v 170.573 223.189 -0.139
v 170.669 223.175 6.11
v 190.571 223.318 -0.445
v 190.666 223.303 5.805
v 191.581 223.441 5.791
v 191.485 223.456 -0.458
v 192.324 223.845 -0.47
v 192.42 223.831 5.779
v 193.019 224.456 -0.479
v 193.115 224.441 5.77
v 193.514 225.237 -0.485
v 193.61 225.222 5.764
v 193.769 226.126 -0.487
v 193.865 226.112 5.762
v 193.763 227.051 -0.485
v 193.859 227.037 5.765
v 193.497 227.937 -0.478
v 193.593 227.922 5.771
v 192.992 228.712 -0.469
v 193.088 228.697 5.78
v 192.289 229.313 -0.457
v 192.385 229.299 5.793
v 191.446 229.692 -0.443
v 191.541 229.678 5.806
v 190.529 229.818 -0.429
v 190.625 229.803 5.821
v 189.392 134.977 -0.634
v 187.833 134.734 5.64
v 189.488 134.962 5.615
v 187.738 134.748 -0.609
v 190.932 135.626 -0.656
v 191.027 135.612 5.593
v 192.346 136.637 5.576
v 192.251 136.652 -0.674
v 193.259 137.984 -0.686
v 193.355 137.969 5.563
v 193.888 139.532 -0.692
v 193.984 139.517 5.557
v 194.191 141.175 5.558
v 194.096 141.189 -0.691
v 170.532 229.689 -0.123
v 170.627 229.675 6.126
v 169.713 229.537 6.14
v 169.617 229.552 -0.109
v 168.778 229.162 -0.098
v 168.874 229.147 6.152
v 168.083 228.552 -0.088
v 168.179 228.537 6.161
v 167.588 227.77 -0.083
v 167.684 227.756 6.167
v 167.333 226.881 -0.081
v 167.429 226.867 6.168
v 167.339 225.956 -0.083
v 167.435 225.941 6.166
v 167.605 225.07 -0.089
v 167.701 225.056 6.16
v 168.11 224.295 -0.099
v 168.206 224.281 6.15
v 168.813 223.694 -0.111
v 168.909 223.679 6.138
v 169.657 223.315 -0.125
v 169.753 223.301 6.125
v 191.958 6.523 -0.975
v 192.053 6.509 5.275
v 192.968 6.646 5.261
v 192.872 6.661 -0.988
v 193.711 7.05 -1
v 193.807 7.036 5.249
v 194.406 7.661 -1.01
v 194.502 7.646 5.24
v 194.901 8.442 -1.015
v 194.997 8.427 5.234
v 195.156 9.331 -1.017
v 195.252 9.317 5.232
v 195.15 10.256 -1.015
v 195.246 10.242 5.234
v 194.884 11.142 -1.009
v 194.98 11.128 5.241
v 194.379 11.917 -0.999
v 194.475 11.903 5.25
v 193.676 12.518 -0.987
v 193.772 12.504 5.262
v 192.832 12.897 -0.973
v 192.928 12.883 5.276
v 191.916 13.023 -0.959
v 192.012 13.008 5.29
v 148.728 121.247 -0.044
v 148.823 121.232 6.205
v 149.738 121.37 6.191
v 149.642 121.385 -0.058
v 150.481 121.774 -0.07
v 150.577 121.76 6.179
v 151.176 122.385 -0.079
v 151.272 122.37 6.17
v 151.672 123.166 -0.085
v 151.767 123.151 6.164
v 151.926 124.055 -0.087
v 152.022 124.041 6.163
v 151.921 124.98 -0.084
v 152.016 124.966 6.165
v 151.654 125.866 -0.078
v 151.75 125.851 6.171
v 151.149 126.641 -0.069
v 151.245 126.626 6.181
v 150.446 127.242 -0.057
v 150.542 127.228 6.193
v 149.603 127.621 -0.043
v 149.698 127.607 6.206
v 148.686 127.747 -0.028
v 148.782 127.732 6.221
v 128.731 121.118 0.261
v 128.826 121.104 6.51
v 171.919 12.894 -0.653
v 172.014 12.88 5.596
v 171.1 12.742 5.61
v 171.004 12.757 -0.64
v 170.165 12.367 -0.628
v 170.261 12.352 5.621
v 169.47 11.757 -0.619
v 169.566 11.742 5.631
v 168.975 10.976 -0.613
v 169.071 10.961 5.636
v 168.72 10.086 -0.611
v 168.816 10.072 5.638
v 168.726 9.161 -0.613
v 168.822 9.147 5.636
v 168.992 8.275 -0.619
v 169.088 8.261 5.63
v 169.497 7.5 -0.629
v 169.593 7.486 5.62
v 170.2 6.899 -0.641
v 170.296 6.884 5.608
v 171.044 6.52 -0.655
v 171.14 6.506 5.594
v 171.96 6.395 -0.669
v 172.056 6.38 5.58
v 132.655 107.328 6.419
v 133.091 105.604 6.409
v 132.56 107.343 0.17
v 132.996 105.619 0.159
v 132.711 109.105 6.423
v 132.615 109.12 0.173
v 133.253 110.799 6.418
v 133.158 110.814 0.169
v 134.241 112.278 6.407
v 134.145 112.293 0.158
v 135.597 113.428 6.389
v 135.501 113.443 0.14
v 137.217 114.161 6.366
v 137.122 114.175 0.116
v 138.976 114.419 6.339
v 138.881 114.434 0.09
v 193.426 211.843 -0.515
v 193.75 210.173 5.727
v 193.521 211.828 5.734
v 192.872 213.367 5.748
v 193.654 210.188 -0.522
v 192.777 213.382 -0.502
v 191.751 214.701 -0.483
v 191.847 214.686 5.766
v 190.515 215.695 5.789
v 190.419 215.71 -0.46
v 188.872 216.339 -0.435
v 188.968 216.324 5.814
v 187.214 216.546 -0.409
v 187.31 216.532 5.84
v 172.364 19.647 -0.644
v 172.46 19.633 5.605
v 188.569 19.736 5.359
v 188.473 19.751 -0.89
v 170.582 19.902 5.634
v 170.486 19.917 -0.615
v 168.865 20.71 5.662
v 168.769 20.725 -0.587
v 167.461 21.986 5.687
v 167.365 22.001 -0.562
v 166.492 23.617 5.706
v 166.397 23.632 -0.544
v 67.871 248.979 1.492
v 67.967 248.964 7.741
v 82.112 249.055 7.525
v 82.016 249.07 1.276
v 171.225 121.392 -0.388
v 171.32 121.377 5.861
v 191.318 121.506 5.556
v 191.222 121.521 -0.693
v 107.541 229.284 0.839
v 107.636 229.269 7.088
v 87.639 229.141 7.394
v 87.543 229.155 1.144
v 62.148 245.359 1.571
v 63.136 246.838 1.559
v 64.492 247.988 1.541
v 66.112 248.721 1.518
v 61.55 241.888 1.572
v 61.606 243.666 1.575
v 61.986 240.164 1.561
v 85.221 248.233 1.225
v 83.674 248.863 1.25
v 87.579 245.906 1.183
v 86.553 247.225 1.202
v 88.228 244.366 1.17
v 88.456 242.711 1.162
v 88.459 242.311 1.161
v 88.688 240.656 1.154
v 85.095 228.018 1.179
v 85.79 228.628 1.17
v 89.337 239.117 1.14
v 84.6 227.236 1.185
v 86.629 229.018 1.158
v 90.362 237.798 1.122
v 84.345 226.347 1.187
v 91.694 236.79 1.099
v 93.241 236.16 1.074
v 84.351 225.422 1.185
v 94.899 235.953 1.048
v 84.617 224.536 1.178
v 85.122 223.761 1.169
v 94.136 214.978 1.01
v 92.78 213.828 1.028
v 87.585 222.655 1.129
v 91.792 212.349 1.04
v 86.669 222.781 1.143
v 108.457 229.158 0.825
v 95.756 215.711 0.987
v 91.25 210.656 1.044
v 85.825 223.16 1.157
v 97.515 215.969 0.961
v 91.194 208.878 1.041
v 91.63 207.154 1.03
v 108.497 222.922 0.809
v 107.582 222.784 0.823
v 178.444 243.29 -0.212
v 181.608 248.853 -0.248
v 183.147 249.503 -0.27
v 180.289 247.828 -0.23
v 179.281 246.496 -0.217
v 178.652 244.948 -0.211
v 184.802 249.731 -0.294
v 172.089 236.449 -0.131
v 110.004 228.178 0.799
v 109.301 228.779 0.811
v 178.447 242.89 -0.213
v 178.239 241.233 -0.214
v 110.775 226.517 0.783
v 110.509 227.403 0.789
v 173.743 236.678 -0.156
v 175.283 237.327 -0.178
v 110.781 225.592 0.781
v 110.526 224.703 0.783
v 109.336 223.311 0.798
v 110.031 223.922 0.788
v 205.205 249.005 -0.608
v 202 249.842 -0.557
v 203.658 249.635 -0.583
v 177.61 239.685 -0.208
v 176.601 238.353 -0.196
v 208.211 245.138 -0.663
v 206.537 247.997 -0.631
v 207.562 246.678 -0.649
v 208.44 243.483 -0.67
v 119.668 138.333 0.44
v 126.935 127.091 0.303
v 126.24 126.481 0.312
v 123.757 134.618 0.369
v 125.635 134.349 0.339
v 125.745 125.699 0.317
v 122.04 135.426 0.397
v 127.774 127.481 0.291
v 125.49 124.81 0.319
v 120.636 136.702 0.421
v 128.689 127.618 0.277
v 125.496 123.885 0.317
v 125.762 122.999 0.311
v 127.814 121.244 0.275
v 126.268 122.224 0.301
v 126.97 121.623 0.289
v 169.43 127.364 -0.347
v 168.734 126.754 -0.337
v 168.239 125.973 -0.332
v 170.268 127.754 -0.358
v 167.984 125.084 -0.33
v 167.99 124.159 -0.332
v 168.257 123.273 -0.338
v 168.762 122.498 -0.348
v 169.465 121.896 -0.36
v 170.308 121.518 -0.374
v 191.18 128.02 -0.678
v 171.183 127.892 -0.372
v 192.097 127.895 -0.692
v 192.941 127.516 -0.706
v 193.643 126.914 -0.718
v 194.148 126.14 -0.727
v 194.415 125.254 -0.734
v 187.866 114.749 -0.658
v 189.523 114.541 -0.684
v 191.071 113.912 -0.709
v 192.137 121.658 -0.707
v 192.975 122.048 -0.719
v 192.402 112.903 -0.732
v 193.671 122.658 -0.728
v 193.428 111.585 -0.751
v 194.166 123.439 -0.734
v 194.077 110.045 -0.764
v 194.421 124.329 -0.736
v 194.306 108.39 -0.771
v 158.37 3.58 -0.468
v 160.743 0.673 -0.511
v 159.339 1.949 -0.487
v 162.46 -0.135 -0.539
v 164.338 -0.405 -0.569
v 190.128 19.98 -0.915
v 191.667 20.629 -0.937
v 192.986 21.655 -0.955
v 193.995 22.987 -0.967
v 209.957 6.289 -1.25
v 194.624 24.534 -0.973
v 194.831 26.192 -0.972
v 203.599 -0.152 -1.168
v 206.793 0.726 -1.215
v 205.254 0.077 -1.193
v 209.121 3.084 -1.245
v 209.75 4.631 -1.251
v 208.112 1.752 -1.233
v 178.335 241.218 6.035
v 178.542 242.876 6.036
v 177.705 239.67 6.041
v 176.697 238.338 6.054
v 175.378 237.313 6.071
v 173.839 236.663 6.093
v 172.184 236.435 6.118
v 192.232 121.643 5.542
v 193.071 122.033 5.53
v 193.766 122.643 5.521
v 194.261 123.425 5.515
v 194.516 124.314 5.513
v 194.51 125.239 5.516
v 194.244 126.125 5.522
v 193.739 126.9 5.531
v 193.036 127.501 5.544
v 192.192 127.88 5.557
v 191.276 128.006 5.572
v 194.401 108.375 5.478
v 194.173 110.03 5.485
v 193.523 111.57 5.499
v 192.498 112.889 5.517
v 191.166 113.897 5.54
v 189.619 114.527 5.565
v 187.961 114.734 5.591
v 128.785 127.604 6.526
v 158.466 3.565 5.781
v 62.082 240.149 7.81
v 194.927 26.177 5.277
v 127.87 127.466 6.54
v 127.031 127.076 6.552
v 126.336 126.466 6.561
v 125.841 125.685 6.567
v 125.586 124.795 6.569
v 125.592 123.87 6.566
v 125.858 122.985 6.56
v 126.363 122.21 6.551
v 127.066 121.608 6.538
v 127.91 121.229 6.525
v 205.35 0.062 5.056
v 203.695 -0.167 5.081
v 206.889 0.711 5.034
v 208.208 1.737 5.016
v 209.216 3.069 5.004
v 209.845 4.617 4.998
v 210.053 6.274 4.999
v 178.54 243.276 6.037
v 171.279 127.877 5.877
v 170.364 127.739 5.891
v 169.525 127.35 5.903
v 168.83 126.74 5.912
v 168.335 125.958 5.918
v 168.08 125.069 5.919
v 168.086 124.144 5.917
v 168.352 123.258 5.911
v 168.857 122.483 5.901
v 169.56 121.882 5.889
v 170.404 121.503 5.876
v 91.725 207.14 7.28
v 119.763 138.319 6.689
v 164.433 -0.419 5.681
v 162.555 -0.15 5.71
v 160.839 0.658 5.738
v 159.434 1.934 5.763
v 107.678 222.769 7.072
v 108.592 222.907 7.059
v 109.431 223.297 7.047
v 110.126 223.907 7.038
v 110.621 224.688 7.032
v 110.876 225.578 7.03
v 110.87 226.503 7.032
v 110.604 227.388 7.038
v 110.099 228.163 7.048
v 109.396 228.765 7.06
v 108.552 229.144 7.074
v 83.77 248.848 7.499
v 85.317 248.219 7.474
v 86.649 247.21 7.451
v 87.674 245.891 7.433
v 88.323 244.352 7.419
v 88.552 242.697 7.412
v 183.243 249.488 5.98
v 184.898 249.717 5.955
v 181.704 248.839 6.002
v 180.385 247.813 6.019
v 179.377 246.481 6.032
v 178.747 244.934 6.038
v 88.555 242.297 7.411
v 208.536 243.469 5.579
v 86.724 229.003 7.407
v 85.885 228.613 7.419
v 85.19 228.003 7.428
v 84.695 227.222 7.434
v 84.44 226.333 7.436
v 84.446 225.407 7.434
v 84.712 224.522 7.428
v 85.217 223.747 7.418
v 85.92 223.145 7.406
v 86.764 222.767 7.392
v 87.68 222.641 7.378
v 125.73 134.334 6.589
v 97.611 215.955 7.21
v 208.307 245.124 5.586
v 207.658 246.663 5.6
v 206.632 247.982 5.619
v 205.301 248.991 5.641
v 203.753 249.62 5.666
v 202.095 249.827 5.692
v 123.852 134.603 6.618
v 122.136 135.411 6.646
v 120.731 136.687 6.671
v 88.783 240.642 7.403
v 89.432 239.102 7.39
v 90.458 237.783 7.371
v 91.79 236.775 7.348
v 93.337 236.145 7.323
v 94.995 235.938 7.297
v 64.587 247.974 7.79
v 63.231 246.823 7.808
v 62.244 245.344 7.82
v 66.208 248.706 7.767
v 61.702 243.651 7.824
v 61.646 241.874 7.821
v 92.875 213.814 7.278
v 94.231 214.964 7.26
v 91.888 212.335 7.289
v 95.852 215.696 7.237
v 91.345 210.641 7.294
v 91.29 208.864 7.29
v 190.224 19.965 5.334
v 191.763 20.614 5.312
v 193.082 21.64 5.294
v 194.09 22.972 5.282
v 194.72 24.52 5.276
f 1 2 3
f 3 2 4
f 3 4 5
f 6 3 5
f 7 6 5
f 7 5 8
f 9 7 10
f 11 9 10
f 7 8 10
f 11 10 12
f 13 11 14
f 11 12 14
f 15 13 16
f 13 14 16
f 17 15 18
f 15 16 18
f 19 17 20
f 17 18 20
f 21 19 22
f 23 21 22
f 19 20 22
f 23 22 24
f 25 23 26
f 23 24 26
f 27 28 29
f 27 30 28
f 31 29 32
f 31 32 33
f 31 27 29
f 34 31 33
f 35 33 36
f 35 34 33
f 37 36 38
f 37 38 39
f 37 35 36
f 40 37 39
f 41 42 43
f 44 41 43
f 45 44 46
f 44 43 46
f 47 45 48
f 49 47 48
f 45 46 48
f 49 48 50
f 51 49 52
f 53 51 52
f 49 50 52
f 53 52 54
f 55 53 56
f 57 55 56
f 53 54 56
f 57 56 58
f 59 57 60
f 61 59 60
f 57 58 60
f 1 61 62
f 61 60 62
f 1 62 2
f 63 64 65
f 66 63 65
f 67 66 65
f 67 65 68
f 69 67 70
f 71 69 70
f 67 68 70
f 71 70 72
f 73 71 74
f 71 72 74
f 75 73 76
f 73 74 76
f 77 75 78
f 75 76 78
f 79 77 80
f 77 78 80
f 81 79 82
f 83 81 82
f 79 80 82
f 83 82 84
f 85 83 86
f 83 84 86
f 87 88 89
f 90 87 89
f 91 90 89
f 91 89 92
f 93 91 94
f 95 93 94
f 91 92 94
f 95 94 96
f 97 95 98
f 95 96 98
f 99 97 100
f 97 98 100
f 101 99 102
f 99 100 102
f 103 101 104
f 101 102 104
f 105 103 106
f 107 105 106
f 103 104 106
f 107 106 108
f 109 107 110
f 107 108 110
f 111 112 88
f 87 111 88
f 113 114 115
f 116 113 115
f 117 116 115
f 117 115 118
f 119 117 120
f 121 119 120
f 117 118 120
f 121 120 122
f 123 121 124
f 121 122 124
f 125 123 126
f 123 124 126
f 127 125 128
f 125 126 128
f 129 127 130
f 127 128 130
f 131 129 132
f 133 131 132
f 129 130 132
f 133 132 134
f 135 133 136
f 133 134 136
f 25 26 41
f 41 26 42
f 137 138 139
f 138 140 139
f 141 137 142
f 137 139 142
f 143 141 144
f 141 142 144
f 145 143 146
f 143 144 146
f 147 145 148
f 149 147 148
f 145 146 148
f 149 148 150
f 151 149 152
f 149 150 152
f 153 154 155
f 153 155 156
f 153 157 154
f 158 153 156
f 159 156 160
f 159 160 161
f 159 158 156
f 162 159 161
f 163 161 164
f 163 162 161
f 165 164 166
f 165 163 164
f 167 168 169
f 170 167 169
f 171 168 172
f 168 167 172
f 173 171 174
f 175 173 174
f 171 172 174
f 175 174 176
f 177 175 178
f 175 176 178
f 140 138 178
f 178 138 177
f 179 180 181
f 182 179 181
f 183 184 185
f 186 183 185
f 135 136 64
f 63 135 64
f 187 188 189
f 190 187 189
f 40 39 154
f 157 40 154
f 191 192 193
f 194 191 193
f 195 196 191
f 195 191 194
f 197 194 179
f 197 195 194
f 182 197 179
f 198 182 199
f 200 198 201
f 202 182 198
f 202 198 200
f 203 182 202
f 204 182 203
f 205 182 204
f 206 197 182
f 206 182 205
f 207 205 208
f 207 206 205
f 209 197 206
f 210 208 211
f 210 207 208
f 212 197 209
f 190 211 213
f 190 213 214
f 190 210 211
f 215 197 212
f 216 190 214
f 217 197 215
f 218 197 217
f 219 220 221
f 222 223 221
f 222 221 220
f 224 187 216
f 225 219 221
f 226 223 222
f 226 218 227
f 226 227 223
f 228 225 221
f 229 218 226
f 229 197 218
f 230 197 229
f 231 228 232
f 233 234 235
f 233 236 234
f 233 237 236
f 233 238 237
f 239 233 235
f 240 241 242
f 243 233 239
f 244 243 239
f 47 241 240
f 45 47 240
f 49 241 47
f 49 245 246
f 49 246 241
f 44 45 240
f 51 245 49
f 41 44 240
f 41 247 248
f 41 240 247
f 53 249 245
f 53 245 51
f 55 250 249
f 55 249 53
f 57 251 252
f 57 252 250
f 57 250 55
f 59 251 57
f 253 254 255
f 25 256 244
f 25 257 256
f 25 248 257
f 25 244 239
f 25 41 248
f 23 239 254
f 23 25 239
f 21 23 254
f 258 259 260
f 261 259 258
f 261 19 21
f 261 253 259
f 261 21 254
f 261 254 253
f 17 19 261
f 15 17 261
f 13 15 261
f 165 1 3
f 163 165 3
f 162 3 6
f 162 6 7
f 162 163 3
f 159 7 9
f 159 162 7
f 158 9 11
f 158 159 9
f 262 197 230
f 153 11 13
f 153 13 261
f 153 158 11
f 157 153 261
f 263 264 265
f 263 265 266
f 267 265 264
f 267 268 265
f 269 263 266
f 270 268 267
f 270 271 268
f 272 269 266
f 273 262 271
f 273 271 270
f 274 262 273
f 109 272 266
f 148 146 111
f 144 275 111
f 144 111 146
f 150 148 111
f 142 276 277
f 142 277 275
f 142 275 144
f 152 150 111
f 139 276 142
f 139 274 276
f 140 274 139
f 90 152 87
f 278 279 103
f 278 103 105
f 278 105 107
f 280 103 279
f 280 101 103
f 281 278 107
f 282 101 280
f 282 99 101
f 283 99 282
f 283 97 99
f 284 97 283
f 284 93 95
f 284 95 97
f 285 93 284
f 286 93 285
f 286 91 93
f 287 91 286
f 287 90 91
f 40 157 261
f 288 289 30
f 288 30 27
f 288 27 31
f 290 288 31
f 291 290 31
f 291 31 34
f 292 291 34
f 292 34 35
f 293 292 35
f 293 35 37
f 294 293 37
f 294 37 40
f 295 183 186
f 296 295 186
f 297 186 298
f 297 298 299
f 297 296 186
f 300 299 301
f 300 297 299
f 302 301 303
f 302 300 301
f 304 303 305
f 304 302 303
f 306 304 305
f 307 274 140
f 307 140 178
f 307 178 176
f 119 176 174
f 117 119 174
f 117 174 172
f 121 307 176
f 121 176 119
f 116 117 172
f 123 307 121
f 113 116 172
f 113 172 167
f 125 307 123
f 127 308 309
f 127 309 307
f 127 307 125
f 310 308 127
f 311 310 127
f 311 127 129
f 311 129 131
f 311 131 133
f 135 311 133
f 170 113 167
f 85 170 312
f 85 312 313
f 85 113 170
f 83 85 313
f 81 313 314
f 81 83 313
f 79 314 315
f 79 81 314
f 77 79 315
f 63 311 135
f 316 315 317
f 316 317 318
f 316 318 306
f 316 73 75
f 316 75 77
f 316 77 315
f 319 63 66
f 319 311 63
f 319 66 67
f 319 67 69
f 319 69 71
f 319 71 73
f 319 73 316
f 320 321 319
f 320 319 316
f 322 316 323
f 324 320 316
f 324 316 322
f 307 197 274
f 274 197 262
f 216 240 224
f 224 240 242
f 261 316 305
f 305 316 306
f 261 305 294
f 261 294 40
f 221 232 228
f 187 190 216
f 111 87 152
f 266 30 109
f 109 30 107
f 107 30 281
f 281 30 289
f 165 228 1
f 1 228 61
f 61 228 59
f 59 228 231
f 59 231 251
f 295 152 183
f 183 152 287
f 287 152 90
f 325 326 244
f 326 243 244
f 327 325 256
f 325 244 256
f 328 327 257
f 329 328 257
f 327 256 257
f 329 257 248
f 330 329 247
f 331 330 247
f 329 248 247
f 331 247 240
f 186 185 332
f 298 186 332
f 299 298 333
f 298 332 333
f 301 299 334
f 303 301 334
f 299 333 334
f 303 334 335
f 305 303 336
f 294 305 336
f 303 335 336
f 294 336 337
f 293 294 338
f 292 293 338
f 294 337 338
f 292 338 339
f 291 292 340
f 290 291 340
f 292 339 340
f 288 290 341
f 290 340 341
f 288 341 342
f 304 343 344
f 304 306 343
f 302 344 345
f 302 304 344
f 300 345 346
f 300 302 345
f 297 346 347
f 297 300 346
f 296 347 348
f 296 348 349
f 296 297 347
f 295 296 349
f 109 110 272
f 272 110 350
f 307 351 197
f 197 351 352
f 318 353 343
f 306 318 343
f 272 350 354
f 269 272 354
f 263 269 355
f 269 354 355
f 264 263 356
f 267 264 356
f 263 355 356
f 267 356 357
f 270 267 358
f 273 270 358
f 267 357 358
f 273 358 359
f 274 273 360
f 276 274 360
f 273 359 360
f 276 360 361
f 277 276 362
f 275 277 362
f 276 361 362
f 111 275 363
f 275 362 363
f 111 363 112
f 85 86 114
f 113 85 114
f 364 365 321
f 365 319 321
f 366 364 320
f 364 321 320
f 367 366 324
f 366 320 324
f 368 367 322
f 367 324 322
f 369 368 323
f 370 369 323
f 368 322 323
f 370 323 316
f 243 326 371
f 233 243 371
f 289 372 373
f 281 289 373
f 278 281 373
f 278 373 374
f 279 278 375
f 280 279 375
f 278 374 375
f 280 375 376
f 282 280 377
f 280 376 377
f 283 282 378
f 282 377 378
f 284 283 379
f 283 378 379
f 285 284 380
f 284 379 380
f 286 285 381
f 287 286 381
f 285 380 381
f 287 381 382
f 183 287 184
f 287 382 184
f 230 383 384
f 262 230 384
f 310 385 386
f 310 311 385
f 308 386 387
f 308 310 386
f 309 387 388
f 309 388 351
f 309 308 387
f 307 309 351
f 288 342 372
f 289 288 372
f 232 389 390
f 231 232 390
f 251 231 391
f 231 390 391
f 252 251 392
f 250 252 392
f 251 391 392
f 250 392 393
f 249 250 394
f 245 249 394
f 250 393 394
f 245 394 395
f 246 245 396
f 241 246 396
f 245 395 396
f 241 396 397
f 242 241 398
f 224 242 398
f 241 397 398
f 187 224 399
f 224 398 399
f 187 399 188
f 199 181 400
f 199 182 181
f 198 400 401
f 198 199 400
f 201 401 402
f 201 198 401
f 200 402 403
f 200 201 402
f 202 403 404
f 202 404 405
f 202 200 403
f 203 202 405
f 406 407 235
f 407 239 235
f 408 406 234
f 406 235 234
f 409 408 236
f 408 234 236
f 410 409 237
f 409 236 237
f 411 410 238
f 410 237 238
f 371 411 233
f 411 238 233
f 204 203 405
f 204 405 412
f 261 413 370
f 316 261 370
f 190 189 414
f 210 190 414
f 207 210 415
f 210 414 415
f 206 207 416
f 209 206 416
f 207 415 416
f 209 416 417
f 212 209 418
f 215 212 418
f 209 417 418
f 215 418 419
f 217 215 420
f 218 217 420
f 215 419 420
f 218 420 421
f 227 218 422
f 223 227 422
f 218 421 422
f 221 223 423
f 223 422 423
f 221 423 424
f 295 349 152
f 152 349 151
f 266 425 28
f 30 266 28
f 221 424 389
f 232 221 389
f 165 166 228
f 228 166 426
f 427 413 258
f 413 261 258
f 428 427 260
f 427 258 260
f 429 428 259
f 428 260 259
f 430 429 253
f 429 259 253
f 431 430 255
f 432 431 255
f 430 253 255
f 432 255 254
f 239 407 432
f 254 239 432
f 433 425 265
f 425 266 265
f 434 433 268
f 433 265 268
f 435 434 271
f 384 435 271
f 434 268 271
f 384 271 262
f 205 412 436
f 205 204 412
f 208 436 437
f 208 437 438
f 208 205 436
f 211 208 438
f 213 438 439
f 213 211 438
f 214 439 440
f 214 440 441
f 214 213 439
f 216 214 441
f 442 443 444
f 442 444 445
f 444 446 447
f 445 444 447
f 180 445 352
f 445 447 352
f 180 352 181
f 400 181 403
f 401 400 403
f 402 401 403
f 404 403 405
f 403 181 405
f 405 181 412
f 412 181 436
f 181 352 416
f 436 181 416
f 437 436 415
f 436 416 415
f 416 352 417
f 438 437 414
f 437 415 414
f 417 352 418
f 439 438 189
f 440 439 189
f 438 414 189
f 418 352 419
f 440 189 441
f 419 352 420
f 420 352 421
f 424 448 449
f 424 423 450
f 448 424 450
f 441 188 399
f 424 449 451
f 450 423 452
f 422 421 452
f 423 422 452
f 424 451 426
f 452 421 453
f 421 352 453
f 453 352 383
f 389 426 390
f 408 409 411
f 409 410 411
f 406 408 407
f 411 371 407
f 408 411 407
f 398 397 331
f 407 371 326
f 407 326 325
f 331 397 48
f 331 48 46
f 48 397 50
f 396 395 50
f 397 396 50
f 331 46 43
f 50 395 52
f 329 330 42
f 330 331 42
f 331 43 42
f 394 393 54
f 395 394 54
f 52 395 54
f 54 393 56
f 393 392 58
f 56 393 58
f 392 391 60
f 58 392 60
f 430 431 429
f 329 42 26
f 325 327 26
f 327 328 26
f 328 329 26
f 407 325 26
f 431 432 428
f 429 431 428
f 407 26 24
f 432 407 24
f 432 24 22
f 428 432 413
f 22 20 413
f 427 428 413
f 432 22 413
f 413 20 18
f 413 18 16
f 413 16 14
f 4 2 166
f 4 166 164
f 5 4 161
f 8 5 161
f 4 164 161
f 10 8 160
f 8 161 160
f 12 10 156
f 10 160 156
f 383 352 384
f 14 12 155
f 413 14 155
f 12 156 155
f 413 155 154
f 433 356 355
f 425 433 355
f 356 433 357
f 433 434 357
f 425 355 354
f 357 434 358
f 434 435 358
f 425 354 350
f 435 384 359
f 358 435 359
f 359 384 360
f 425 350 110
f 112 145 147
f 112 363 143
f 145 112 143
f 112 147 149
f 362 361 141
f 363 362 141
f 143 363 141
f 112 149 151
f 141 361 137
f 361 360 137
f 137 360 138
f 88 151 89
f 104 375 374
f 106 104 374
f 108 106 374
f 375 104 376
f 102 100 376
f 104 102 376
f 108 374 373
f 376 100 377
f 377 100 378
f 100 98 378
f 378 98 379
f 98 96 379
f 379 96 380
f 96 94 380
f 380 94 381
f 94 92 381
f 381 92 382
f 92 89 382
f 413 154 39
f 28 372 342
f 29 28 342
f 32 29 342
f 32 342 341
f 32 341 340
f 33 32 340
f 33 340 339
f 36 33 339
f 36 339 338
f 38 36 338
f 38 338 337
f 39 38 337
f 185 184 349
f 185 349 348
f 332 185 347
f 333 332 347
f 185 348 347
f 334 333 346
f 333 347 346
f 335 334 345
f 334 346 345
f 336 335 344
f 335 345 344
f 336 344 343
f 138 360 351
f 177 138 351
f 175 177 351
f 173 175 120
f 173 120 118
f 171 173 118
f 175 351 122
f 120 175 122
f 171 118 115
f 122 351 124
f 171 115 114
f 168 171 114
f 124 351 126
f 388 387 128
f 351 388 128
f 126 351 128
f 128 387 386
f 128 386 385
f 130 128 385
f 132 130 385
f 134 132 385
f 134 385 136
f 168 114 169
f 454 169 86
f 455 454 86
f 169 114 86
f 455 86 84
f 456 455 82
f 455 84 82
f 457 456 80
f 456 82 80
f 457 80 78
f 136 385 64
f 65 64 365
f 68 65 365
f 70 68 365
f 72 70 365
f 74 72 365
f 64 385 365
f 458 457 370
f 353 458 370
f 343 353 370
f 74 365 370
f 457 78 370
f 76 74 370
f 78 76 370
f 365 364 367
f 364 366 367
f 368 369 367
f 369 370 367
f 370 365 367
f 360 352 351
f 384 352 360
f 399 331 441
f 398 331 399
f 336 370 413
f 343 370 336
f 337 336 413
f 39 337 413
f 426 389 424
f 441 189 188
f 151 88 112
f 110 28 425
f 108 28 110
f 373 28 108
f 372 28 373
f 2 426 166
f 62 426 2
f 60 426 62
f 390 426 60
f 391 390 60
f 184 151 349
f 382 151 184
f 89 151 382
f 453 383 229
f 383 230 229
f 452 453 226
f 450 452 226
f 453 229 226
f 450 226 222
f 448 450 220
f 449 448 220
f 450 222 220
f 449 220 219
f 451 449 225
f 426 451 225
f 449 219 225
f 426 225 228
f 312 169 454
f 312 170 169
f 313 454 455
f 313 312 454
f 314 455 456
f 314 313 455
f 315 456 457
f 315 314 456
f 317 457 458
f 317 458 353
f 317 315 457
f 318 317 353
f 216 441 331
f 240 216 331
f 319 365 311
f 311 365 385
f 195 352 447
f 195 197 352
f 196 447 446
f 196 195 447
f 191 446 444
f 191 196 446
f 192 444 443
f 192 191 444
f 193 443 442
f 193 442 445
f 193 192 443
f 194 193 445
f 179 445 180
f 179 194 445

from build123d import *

# Parameters (mm, degrees)
PAD_DEPTH              = 6.25
FILLET_R               = 6.4
MIRROR_ROLL_ANGLE      = -179.860361
MIRROR_PITCH_ANGLE     = 0.86933
MIRROR_PLACEMENT_ANGLE = 0.335531


with BuildPart() as body:
    # Sketch → Pad (new body)
    with BuildSketch(Plane.XY):
        Polygon((0, 250), (50, 250), (150, 0), (120, 0), (120, 13.2), (30, 13.2), (30, 0), (0, 0), align=None)
        Polygon((15, 230), (15, 135), (79.844506, 135), (41.844506, 230), align=None, mode=Mode.SUBTRACT)
        Polygon((15, 115), (15, 33.2), (120.564506, 33.2), (87.844506, 115), align=None, mode=Mode.SUBTRACT)
        with BuildLine():
            ThreePointArc((18, 243.25), (14.75, 240), (18, 236.75))
            Line((18, 236.75), (38, 236.75))
            ThreePointArc((38, 236.75), (41.25, 240), (38, 243.25))
            Line((38, 243.25), (18, 243.25))
        make_face(mode=Mode.SUBTRACT)
        with BuildLine():
            ThreePointArc((60.5, 128.25), (57.25, 125), (60.5, 121.75))
            Line((60.5, 121.75), (80.5, 121.75))
            ThreePointArc((80.5, 121.75), (83.75, 125), (80.5, 128.25))
            Line((80.5, 128.25), (60.5, 128.25))
        make_face(mode=Mode.SUBTRACT)
        with BuildLine():
            ThreePointArc((18, 128.25), (14.75, 125), (18, 121.75))
            Line((18, 121.75), (38, 121.75))
            ThreePointArc((38, 121.75), (41.25, 125), (38, 128.25))
            Line((38, 128.25), (18, 128.25))
        make_face(mode=Mode.SUBTRACT)
        with BuildLine():
            ThreePointArc((18, 26.45), (14.75, 23.2), (18, 19.95))
            Line((18, 19.95), (38, 19.95))
            ThreePointArc((38, 19.95), (41.25, 23.2), (38, 26.45))
            Line((38, 26.45), (18, 26.45))
        make_face(mode=Mode.SUBTRACT)
        with BuildLine():
            ThreePointArc((101, 26.45), (97.75, 23.2), (101, 19.95))
            Line((101, 19.95), (121, 19.95))
            ThreePointArc((121, 19.95), (124.25, 23.2), (121, 26.45))
            Line((121, 26.45), (101, 26.45))
        make_face(mode=Mode.SUBTRACT)
    extrude(amount=PAD_DEPTH)

    # Fillet
    fillet_edges = [body.edges().sort_by_distance(p)[0] for p in [
        (0, 0, 3.125),
        (50, 250, 3.125),
        (0, 250, 3.125),
        (150, 0, 3.125),
        (120, 0, 3.125),
        (30, 0, 3.125),
        (41.844506, 230, 3.125),
        (15, 230, 3.125),
        (87.844506, 115, 3.125),
        (15, 115, 3.125),
        (15, 135, 3.125),
        (15, 33.2, 3.125),
        (120.564506, 33.2, 3.125),
        (79.844506, 135, 3.125),
        (30, 13.2, 3.125),
        (120, 13.2, 3.125),
    ]]
    fillet(fillet_edges, radius=FILLET_R)


with BuildPart() as body_mirrored:
    # mirror: instance of Body
    add(body.part.mirror(Plane(origin=(159.79538, 145.255219, 2.976273), x_dir=(0.000289, 1, 0), z_dir=(-1, 0.000289, -5.1e-05))))


with BuildPart() as body_mirrored_1:
    # mirror roll: moved
    add(body_mirrored.part.rotate(Axis((0, 0, 0), (1, 0, 0)), MIRROR_ROLL_ANGLE))


with BuildPart() as body_mirrored_2:
    # mirror pitch: moved
    add(body_mirrored_1.part.rotate(Axis((0, 0, 0), (0, 1, 0)), MIRROR_PITCH_ANGLE))


with BuildPart() as body_mirrored_3:
    # mirror placement: moved
    add(body_mirrored_2.part.moved(Location((-110.969424, 247.905415, 10.458181))).rotate(Axis((-110.969424, 247.905415, 10.458181), (0, 0, 1)), MIRROR_PLACEMENT_ANGLE))


solid = body_mirrored_3.part
